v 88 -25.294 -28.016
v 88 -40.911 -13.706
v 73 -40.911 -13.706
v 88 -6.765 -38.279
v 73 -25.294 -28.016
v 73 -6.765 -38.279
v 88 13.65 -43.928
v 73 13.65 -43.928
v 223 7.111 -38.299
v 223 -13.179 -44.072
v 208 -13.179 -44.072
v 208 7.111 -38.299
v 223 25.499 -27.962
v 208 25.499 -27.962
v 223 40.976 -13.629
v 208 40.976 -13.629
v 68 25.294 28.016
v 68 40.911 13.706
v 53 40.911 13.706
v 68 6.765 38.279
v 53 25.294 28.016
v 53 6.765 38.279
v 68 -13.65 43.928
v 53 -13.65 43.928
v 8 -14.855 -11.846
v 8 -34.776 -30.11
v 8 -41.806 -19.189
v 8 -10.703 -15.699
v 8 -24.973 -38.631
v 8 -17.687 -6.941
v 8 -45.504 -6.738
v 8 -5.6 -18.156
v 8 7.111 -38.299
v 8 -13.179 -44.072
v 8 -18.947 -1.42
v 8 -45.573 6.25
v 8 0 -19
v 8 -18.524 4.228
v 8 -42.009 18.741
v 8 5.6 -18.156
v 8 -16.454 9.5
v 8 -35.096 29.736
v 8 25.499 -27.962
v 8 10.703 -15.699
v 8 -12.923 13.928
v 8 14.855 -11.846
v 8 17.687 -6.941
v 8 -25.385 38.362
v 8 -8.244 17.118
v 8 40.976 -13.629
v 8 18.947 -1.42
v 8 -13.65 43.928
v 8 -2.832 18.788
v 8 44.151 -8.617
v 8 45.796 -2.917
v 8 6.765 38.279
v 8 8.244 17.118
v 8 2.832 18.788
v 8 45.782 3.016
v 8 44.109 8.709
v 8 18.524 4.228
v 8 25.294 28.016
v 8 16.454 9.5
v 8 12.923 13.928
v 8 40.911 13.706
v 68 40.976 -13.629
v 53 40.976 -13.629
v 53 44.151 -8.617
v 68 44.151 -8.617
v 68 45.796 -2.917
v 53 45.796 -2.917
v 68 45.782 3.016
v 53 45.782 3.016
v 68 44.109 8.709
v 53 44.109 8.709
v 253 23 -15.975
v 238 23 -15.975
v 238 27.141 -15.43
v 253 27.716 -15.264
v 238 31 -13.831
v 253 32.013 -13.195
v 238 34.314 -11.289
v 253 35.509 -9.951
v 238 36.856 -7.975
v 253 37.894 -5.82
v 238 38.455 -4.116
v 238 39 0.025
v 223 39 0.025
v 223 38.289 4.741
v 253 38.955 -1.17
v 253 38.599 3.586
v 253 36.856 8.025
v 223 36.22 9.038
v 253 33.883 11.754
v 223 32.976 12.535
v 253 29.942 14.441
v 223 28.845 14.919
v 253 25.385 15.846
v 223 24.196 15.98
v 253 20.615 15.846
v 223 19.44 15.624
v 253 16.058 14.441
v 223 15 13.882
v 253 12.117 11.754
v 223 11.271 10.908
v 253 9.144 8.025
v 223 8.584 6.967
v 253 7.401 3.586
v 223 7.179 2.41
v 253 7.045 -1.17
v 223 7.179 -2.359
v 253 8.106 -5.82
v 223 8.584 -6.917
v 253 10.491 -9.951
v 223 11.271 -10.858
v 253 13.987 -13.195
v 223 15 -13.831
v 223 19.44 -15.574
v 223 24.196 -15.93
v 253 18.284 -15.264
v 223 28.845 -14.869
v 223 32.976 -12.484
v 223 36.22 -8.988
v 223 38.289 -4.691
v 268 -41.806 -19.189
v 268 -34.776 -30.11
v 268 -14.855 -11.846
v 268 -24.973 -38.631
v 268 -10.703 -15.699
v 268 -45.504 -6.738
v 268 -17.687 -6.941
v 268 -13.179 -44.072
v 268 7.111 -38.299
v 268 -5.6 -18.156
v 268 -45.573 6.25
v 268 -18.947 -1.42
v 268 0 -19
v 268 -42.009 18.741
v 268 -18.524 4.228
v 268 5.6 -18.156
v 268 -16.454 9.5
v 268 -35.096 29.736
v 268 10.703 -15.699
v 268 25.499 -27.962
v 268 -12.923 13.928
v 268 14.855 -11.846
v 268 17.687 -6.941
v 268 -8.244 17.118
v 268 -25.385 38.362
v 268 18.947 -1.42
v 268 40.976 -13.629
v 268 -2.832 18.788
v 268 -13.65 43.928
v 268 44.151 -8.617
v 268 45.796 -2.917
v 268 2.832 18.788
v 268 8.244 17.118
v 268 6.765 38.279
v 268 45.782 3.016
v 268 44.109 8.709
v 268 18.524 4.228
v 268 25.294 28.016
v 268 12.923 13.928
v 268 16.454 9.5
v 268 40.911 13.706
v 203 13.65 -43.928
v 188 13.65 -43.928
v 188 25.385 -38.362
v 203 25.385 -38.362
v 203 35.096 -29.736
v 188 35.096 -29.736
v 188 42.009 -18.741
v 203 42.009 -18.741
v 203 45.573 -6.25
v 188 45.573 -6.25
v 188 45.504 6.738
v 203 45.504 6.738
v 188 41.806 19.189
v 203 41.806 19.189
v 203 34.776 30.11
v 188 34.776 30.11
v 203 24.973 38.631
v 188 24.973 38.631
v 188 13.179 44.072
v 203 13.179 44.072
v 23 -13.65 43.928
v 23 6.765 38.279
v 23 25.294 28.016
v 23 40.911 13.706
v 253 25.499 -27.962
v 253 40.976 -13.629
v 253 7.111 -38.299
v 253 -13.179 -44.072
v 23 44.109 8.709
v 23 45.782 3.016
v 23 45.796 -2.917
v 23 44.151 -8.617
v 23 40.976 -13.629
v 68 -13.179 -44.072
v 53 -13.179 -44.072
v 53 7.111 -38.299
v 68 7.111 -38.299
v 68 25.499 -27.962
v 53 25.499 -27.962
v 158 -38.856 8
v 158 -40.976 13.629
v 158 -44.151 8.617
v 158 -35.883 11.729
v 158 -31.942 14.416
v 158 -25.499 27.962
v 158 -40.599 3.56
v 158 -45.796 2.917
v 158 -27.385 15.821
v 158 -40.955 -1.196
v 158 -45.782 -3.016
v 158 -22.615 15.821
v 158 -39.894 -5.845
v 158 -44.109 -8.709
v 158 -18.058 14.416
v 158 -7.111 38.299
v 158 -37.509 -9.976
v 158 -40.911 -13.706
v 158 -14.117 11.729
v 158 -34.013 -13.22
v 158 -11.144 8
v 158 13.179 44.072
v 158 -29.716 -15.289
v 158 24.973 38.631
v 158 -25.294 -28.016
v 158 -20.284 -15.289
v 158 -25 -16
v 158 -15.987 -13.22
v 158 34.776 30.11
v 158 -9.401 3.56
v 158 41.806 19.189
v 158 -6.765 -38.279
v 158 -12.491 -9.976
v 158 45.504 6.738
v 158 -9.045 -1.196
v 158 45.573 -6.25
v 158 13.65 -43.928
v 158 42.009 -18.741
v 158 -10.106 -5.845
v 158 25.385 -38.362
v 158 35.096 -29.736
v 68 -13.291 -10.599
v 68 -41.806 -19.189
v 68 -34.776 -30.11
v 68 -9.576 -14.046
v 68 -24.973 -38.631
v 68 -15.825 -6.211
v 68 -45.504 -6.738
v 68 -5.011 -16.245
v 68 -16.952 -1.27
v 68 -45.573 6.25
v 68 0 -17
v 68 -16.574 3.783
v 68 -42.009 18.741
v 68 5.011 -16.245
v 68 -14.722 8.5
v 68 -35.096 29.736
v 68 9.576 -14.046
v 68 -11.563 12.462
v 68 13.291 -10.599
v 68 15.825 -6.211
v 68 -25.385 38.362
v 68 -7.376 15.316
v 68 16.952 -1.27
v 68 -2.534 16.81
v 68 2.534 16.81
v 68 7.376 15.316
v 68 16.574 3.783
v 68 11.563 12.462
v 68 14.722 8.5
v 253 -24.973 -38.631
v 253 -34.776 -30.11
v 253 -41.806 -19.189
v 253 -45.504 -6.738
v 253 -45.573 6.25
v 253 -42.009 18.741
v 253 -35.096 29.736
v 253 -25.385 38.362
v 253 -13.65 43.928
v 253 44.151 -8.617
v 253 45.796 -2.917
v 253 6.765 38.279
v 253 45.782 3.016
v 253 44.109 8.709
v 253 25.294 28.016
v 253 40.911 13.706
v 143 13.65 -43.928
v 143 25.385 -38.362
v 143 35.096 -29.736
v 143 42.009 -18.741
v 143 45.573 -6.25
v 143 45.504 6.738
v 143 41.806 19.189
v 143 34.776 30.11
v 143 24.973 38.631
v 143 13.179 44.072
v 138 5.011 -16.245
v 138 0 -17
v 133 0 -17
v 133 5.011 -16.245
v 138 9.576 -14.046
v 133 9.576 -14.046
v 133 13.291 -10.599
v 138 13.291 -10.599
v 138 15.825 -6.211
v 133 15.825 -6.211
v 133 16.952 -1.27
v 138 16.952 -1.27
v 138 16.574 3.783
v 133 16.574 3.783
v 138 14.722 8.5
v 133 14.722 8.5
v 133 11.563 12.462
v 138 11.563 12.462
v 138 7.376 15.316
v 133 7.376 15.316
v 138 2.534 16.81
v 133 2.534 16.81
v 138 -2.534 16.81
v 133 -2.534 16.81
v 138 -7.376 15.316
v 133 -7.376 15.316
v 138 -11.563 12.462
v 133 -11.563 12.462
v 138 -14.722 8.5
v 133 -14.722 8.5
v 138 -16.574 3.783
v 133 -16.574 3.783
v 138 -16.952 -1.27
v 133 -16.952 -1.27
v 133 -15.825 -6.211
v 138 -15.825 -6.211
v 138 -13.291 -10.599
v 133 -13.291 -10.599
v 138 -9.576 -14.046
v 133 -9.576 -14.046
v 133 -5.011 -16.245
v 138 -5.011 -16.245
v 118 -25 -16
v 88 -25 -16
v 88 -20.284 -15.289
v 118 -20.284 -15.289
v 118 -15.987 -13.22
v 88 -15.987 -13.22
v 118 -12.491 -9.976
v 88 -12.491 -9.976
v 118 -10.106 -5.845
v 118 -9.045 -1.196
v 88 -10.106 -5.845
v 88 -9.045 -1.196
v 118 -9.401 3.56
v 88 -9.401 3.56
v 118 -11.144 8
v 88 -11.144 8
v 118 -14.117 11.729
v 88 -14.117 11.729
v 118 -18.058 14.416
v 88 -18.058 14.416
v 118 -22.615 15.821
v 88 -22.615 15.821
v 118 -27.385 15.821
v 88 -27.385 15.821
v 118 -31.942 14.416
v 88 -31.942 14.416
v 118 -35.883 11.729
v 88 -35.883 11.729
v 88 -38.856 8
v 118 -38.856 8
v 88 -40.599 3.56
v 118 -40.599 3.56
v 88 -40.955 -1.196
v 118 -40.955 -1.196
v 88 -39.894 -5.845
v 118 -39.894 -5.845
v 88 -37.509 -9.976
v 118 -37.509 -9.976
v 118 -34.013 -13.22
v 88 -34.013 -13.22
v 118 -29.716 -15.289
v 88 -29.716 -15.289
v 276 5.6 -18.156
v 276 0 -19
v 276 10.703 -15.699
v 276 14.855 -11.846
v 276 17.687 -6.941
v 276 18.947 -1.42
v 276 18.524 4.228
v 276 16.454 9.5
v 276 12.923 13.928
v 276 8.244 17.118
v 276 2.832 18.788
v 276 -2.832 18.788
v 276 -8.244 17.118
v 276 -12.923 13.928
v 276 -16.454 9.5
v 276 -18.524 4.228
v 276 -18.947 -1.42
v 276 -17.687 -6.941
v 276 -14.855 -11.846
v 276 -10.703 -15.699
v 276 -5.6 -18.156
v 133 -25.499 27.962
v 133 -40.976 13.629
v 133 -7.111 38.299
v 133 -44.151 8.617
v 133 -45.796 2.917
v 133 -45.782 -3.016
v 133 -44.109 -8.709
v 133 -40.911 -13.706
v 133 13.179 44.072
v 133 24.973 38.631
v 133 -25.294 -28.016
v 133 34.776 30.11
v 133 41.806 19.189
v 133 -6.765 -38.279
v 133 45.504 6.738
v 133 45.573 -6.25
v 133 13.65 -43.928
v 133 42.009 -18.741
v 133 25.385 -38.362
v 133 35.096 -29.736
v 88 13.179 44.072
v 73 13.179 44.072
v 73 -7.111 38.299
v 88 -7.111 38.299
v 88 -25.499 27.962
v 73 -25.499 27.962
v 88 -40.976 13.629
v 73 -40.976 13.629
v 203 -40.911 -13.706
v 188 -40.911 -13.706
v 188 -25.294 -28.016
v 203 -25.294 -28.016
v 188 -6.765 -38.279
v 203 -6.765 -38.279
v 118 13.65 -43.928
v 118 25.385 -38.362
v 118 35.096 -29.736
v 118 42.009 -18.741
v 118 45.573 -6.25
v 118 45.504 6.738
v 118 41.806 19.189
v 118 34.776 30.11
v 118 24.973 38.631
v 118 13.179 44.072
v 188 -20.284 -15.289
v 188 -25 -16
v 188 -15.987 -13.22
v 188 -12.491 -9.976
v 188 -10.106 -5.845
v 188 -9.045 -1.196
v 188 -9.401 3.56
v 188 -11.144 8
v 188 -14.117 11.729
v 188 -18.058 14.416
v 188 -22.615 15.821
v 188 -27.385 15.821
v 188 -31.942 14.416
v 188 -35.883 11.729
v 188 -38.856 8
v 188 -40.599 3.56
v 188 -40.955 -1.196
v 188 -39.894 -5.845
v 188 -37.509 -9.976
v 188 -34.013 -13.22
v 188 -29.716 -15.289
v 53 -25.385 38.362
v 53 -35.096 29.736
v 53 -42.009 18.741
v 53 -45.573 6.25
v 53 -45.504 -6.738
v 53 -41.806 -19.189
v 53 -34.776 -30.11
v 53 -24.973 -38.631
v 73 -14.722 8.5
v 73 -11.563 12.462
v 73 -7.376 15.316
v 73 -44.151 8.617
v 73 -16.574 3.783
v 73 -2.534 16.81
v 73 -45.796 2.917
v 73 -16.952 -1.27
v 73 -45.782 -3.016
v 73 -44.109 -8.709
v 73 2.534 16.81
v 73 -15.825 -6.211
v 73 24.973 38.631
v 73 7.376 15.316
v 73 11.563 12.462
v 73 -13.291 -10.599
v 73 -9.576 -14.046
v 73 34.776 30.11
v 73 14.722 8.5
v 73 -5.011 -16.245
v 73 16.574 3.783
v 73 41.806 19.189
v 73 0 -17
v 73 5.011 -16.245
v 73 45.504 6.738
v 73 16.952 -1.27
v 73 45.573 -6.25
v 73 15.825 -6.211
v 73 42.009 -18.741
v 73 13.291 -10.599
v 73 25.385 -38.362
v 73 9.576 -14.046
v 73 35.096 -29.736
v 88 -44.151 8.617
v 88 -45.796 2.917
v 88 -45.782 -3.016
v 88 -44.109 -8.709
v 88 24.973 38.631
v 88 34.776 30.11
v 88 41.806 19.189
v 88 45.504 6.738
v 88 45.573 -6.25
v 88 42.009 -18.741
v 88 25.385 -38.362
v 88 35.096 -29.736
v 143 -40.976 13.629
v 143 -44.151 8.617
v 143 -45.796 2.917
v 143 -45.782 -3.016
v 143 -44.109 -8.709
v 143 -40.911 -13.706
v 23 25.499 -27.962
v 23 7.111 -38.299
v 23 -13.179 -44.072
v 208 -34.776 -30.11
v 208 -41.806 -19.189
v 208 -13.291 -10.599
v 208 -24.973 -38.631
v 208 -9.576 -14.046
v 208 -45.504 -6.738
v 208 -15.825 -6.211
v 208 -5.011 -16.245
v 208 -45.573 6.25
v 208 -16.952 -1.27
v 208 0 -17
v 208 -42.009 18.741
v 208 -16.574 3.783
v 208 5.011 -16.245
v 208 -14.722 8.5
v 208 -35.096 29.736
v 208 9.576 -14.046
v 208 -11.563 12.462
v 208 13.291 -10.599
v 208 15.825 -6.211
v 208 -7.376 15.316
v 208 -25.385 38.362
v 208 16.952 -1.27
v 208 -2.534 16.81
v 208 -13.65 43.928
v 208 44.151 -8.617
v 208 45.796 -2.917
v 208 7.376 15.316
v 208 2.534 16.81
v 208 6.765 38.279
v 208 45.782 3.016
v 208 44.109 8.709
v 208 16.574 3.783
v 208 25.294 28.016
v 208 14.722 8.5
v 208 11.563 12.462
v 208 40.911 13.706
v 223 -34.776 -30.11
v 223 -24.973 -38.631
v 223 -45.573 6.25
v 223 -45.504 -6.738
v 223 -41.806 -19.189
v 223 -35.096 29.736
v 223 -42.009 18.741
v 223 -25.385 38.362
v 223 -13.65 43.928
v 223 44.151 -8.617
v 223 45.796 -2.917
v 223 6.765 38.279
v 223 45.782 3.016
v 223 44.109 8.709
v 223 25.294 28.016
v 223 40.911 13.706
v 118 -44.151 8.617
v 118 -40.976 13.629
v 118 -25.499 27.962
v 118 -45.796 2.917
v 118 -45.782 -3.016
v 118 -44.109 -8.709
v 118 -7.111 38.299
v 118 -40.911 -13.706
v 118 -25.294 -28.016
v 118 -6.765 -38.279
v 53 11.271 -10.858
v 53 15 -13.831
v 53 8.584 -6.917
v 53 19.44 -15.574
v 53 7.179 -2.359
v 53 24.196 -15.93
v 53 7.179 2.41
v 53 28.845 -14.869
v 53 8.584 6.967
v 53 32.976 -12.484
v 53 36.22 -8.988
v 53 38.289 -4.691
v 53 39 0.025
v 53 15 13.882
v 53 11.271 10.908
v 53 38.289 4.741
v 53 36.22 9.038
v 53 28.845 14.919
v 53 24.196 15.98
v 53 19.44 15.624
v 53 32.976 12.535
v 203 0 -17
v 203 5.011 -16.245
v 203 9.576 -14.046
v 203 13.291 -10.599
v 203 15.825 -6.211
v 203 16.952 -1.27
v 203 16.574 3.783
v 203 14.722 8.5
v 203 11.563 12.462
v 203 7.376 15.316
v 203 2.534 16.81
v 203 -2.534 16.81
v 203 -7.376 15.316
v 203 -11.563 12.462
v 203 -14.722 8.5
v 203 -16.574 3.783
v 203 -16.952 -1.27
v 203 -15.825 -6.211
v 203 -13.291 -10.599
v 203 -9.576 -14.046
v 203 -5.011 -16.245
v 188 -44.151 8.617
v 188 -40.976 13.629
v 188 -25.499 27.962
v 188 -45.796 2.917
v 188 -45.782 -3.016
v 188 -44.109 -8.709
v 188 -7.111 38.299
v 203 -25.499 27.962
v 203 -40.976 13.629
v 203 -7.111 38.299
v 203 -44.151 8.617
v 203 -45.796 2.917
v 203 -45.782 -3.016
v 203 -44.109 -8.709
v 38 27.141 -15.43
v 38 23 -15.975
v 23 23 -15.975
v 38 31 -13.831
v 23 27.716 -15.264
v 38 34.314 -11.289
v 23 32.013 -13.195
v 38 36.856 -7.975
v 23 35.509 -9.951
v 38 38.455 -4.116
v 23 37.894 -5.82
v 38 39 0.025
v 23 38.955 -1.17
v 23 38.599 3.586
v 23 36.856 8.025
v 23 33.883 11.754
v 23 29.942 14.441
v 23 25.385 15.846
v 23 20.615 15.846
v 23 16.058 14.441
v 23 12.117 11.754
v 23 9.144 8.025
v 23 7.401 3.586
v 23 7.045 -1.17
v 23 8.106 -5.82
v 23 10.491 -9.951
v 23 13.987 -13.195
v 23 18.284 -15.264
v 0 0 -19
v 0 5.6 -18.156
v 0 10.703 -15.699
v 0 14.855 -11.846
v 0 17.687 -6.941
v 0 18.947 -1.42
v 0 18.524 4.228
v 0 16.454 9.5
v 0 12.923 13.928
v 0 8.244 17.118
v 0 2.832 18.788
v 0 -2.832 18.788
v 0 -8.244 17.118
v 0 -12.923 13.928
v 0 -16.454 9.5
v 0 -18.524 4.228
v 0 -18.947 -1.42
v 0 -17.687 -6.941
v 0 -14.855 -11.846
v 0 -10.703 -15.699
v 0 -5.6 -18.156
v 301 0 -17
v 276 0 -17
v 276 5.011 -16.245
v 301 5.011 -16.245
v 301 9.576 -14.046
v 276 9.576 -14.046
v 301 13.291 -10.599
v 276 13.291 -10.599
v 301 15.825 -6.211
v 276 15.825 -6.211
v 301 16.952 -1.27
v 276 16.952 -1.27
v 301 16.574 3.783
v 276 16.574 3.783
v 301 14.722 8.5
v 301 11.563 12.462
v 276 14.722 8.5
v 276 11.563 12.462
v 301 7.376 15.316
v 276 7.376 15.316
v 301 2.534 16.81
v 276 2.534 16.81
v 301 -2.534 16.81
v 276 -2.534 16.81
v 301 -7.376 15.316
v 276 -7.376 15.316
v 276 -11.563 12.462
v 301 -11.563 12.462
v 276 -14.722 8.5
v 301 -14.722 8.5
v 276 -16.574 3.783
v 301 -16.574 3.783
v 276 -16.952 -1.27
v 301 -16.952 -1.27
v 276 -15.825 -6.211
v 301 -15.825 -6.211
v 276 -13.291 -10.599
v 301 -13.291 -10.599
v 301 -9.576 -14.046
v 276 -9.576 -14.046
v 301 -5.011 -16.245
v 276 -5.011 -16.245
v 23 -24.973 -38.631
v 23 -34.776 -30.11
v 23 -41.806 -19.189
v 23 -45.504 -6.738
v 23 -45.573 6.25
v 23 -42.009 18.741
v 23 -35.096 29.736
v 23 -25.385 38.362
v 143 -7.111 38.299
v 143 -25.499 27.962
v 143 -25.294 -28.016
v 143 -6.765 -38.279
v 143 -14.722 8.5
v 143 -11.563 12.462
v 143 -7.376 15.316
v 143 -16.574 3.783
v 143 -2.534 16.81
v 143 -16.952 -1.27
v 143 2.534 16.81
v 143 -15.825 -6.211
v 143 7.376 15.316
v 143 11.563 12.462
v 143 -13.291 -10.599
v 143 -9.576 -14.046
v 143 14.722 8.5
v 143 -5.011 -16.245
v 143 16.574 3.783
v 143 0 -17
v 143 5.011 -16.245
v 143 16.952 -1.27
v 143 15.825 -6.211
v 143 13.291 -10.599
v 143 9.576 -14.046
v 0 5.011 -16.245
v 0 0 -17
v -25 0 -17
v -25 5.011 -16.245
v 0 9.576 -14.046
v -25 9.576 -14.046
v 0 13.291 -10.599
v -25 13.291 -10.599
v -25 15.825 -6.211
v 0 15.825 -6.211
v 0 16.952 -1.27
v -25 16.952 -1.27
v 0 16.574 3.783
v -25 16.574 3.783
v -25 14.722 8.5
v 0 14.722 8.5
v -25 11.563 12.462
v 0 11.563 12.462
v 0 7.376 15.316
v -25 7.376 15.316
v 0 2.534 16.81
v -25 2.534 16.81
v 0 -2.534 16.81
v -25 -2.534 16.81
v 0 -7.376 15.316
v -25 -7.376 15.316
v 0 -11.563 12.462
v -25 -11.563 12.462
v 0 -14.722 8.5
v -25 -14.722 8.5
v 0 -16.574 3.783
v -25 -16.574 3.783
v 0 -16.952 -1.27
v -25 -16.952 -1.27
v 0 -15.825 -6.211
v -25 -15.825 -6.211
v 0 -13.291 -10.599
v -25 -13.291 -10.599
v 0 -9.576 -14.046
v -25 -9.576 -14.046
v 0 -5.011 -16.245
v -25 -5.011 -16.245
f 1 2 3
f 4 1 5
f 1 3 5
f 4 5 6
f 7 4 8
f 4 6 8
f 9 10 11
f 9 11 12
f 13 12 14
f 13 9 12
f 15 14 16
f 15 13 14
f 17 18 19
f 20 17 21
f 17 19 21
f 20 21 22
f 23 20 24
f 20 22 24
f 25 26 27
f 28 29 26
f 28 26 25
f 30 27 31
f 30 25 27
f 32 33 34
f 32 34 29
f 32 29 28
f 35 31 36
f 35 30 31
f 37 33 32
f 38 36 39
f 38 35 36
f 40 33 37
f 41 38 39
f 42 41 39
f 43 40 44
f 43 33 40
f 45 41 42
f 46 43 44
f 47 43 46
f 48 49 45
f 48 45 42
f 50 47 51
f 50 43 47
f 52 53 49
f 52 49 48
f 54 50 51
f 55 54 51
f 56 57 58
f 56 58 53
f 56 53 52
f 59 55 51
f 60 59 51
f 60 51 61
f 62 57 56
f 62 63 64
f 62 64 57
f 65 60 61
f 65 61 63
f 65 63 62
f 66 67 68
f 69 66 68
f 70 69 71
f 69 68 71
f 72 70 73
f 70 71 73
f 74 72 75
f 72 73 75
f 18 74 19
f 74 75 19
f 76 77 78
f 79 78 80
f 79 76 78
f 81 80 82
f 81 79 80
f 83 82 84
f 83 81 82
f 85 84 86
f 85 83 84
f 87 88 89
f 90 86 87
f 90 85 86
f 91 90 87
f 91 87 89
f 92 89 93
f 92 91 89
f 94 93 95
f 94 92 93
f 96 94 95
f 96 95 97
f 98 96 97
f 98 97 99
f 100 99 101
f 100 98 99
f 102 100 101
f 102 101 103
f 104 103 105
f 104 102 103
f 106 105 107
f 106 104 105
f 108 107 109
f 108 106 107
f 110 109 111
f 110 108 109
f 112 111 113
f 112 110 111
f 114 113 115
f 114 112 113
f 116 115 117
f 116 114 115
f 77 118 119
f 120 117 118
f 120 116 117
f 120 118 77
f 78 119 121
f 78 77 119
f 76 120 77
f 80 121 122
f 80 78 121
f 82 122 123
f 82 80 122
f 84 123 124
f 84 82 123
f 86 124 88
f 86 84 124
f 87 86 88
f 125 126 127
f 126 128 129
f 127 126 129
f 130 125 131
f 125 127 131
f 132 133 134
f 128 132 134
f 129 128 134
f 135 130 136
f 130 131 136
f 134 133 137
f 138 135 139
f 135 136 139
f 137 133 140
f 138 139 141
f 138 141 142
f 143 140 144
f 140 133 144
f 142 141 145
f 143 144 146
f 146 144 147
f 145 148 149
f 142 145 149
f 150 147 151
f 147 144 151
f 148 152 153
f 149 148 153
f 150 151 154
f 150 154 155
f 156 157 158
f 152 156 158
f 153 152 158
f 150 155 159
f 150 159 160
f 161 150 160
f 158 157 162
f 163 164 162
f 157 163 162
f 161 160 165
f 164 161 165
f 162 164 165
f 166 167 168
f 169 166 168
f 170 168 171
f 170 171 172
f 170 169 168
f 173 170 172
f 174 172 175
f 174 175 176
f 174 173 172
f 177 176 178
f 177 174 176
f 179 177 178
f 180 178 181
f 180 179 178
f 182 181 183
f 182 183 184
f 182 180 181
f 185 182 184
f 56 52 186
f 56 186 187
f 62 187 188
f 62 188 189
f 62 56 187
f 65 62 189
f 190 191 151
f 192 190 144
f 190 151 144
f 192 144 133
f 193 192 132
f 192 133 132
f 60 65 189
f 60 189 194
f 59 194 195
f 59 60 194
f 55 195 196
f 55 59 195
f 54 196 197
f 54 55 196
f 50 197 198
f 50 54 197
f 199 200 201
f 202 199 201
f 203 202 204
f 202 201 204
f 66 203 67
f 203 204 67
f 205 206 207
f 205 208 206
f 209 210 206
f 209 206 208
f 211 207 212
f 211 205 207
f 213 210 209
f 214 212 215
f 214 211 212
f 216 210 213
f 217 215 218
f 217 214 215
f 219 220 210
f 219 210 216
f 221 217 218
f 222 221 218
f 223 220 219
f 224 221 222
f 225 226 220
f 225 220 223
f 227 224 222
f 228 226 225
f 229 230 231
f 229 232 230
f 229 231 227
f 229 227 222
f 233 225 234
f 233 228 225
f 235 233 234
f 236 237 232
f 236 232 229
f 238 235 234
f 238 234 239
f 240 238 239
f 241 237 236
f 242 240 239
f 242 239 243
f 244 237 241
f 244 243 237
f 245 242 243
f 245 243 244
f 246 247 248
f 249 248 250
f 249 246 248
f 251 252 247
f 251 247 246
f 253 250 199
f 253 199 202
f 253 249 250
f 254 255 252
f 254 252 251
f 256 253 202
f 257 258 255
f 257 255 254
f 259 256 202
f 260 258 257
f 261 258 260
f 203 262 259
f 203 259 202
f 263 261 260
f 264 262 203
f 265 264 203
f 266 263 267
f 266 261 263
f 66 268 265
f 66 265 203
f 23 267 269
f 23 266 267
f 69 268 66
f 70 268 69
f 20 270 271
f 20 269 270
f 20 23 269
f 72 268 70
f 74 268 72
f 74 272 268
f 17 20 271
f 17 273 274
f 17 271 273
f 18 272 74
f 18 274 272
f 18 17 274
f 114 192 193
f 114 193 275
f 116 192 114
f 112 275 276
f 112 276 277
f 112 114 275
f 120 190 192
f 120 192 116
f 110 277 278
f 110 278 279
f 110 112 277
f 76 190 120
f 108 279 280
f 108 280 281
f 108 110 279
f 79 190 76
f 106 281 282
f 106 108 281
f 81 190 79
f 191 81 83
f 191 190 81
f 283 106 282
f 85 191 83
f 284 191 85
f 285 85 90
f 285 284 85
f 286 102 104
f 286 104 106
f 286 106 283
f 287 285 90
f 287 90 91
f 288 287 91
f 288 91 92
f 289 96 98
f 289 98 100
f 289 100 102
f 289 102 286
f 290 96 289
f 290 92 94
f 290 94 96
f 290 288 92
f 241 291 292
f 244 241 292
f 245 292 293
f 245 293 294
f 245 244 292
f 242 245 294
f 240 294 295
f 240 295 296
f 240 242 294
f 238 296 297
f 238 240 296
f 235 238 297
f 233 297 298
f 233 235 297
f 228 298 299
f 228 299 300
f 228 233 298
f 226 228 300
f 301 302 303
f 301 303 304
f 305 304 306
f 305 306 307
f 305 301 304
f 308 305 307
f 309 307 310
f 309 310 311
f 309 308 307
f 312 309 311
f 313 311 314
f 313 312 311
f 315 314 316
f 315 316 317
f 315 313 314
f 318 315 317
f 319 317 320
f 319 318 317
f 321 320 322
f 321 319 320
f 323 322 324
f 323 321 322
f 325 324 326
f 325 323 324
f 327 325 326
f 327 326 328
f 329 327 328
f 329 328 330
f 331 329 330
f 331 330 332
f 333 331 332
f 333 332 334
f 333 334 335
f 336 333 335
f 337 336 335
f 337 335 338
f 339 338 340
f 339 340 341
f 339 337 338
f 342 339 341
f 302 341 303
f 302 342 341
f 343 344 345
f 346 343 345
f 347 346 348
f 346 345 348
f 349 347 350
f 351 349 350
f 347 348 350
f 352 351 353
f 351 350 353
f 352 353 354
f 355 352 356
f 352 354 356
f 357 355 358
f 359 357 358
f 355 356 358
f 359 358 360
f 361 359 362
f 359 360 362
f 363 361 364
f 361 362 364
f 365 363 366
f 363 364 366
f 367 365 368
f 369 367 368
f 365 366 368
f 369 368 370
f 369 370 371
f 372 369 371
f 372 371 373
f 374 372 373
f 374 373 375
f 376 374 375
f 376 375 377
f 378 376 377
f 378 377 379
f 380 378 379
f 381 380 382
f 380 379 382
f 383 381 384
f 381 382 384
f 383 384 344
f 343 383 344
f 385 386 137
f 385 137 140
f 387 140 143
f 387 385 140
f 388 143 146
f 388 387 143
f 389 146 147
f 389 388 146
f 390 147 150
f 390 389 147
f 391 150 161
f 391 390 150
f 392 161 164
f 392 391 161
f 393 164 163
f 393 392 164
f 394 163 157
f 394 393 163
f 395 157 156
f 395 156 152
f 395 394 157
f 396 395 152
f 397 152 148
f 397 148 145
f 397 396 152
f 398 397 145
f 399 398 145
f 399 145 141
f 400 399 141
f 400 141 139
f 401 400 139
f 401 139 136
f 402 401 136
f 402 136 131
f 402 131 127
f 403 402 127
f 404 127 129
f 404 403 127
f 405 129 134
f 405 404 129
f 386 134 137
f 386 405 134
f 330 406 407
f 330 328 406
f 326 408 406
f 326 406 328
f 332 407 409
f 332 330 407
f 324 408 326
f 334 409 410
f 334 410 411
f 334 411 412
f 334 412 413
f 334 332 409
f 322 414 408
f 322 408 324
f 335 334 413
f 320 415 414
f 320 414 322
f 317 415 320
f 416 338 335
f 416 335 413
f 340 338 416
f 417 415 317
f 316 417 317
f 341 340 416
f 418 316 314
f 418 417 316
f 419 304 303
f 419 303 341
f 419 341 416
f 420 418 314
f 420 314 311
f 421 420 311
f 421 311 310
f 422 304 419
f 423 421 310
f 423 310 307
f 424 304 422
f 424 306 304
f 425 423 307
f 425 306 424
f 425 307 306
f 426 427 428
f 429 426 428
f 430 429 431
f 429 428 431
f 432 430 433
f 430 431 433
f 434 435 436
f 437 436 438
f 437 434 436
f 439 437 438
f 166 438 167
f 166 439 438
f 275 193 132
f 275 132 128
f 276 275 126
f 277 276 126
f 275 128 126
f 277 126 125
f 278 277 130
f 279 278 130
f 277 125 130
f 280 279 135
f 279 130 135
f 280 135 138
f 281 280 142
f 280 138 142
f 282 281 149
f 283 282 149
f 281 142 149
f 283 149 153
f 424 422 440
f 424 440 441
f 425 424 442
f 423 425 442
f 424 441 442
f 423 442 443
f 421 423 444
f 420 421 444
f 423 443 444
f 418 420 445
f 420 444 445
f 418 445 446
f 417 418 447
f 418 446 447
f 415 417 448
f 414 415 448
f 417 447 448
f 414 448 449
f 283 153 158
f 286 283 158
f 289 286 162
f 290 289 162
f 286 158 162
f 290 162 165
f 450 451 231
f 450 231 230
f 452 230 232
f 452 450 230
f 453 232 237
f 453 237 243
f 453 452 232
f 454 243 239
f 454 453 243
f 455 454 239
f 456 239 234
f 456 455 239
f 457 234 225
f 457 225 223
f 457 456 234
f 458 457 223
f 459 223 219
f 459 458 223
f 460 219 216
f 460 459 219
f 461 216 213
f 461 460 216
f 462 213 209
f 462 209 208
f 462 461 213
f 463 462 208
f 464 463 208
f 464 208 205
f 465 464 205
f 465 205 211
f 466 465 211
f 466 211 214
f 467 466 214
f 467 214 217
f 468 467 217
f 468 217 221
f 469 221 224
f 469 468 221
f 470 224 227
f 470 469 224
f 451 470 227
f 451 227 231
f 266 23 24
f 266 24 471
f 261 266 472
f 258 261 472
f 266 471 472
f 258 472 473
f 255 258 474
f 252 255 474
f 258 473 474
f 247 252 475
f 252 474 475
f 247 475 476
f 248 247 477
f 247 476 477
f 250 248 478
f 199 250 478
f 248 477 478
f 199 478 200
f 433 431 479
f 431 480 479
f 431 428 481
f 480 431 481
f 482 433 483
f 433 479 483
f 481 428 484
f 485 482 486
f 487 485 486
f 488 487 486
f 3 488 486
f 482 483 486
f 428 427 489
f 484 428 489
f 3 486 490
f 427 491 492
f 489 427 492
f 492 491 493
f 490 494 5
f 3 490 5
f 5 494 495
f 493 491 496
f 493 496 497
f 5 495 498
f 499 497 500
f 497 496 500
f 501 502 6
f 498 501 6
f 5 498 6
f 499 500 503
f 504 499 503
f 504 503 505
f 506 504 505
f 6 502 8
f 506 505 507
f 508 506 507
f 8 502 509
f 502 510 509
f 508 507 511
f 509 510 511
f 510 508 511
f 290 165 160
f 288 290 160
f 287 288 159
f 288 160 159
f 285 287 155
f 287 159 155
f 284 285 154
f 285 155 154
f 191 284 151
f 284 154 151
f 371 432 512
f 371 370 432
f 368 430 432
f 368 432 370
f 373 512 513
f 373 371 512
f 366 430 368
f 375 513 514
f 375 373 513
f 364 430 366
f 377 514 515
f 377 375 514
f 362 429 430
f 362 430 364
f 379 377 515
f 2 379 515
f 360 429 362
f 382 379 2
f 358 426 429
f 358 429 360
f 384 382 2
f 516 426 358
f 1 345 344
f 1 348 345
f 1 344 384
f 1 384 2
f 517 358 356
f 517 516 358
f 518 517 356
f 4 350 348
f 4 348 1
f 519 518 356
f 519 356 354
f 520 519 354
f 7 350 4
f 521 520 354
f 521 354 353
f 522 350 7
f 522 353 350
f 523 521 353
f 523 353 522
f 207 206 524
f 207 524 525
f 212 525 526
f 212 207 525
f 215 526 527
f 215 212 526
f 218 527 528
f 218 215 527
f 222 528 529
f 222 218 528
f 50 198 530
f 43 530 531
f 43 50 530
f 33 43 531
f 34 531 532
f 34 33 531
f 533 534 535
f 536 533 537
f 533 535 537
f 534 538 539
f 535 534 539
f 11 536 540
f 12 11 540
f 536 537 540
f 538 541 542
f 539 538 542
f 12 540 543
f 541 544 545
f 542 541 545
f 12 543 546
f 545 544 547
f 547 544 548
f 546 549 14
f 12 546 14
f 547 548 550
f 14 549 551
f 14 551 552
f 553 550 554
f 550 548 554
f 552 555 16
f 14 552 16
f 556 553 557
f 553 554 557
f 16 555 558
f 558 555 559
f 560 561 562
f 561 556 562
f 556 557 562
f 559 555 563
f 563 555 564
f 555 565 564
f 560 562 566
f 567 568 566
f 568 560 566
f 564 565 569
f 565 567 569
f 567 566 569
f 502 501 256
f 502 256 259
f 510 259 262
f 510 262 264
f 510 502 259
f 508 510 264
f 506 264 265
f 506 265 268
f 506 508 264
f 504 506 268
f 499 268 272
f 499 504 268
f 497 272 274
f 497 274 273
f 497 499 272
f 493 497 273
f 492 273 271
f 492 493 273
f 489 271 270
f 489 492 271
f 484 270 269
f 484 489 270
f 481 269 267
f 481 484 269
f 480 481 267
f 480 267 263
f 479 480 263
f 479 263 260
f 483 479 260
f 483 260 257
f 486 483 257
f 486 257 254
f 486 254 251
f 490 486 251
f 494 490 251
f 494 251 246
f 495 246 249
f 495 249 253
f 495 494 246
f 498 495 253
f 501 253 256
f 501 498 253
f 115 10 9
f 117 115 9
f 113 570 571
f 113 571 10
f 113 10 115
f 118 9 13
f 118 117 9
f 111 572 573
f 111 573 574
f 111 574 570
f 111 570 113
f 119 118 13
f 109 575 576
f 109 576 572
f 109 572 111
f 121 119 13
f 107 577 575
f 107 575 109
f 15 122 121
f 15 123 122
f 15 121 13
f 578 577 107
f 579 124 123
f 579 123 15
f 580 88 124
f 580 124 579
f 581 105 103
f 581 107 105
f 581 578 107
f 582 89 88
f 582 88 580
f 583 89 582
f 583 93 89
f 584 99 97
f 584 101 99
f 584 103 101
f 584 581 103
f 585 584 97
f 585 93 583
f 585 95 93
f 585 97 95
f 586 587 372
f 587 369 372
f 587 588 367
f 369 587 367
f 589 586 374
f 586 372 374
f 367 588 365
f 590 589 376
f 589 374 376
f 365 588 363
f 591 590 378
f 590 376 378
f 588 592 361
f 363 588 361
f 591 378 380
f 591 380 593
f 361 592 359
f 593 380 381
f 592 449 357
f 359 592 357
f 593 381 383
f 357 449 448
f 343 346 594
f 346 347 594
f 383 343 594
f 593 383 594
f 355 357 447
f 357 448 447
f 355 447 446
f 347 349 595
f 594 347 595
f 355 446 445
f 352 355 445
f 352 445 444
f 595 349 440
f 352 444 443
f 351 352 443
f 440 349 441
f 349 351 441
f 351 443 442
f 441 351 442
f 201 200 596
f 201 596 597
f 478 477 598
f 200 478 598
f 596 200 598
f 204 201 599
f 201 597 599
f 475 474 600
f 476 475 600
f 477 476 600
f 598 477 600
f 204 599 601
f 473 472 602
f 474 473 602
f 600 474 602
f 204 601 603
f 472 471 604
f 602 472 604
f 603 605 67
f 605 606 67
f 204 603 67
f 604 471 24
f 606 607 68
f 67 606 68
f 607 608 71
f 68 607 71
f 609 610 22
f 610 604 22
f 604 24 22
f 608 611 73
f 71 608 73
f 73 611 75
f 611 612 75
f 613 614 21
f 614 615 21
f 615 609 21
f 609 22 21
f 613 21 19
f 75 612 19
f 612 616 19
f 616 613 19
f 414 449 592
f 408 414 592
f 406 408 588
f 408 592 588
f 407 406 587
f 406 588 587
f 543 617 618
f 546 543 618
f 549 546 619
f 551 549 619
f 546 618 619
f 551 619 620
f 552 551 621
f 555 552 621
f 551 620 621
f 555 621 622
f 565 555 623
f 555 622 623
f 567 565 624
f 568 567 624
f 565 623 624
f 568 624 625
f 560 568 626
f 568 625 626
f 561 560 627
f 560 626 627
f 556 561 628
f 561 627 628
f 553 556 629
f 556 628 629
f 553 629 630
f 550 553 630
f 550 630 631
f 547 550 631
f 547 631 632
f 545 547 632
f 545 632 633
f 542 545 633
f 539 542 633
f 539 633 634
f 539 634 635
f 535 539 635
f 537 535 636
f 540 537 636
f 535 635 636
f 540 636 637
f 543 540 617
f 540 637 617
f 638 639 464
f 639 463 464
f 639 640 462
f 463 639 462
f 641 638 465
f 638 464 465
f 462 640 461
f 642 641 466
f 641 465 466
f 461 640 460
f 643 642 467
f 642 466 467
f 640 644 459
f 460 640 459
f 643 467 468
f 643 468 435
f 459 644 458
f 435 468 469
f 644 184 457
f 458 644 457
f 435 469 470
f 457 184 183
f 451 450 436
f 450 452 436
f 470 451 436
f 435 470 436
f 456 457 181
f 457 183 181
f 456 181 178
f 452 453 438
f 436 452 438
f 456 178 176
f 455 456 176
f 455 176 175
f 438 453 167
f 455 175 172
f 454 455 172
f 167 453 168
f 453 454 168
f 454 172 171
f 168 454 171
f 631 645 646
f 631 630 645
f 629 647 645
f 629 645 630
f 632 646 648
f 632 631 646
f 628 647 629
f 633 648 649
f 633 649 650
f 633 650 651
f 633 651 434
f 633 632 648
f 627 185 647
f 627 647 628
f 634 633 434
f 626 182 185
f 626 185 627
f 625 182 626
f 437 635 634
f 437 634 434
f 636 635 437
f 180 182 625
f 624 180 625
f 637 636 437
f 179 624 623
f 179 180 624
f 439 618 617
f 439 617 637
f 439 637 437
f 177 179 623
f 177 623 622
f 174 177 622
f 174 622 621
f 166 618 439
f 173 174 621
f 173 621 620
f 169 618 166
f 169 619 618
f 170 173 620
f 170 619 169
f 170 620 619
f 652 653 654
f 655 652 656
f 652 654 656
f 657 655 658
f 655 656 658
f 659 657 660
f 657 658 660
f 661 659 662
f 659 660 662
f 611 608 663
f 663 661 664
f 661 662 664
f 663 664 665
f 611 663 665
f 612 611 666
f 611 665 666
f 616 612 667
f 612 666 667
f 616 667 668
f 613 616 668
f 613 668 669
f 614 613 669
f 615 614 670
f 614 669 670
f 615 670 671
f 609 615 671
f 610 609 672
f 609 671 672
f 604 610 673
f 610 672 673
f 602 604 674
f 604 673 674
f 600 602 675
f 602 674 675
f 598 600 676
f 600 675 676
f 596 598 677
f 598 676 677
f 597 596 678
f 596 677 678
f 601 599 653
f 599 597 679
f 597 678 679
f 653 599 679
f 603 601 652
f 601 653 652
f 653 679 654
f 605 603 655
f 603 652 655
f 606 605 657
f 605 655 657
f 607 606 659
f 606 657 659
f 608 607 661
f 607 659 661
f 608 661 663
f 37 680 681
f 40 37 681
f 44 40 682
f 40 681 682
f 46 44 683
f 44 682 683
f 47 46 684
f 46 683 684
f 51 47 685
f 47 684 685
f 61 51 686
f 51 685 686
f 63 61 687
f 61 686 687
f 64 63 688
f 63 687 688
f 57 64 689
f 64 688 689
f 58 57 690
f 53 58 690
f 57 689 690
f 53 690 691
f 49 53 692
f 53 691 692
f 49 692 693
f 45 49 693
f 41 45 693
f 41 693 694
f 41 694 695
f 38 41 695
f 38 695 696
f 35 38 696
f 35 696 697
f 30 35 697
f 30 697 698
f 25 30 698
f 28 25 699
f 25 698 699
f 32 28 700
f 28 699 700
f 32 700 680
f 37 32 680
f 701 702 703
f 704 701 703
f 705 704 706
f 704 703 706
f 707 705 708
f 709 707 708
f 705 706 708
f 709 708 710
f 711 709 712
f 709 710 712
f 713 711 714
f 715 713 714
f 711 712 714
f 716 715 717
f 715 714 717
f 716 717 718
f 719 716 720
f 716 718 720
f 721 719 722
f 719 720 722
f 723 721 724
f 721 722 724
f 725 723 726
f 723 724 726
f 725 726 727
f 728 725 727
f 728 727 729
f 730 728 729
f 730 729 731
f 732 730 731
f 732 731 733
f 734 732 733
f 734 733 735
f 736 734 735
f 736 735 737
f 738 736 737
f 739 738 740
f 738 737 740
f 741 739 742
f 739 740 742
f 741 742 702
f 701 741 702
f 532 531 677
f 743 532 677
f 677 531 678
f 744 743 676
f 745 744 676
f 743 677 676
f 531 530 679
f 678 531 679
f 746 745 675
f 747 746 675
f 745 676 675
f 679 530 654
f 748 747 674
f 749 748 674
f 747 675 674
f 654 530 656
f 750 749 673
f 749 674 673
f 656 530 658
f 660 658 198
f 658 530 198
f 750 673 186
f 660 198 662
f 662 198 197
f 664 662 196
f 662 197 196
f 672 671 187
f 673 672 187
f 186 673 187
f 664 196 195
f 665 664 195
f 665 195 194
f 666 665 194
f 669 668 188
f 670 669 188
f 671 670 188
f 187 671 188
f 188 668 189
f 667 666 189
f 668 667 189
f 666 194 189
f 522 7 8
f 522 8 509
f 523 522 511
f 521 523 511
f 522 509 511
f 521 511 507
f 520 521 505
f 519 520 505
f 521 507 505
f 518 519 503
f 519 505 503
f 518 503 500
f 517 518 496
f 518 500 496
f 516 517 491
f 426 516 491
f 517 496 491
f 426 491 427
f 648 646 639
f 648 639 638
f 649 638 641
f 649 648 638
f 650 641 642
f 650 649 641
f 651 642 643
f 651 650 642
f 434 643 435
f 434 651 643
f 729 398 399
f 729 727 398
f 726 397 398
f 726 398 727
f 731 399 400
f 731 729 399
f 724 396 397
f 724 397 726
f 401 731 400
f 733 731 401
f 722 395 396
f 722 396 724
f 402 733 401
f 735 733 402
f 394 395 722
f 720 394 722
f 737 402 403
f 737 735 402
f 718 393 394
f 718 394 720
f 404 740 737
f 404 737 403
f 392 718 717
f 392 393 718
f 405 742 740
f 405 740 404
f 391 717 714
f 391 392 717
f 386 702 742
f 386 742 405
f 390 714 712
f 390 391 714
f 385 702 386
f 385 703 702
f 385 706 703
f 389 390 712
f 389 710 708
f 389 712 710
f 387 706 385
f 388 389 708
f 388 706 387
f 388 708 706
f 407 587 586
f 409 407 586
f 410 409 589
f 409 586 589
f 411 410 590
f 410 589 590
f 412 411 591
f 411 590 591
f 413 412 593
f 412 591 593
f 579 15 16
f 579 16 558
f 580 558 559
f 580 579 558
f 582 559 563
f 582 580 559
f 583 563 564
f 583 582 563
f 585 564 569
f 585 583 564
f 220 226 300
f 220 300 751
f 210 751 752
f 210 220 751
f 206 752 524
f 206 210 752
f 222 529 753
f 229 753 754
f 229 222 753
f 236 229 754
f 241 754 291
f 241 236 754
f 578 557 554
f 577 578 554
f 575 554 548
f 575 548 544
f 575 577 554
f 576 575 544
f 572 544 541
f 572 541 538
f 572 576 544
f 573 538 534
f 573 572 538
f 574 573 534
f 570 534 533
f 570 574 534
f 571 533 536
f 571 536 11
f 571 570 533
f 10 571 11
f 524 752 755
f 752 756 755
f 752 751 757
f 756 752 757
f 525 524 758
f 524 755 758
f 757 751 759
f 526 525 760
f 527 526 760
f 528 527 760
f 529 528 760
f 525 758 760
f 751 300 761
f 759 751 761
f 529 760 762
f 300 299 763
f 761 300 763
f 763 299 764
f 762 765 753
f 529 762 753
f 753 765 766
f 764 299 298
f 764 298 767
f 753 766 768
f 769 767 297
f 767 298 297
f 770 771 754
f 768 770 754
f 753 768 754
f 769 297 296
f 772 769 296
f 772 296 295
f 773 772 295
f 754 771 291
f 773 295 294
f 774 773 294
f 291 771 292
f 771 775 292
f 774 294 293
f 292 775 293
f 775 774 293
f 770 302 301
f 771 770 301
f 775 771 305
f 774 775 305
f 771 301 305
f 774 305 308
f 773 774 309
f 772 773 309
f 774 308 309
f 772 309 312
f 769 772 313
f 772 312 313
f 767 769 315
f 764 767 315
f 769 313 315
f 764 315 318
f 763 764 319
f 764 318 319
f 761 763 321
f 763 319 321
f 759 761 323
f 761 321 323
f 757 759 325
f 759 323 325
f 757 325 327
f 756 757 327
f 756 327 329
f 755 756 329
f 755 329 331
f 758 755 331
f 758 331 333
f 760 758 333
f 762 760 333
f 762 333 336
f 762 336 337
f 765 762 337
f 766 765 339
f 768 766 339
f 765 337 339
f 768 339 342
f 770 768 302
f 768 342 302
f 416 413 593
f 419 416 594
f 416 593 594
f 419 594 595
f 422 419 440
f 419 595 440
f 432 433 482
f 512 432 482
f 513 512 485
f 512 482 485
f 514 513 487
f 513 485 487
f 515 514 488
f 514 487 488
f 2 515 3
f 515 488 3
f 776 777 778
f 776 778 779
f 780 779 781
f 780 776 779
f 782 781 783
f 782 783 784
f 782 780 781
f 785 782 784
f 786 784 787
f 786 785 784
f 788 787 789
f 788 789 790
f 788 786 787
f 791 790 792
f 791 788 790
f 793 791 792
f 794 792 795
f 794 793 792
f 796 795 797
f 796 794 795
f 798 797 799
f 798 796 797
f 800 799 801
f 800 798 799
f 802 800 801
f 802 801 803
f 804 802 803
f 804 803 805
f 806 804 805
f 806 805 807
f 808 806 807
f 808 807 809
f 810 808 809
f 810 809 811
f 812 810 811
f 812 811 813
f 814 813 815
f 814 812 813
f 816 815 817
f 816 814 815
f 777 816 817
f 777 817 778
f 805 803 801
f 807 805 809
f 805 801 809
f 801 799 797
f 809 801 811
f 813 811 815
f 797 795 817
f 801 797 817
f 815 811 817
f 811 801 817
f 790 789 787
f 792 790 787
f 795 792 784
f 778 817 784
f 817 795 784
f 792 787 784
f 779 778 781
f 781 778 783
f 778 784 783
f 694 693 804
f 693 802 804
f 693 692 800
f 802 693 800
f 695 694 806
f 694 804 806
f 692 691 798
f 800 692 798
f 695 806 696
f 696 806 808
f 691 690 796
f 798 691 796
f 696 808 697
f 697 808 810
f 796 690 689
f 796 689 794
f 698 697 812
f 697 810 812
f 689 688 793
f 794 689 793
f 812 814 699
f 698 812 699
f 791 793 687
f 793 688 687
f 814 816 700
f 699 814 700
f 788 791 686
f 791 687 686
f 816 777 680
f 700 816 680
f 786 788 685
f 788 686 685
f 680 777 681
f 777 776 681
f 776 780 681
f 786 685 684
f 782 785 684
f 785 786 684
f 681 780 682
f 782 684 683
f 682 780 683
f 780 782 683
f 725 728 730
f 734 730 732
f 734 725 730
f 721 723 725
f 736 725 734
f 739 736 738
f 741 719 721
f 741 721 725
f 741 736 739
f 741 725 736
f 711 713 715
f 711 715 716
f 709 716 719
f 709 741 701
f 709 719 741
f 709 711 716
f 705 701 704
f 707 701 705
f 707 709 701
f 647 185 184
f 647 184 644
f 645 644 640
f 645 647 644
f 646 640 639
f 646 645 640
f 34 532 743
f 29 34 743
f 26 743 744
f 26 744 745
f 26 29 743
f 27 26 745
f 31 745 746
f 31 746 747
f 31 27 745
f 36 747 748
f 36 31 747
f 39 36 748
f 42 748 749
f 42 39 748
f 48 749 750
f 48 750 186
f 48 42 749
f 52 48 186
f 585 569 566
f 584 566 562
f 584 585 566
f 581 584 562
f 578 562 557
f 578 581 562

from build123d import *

# Parameters (mm, degrees)
SKETCH1_R            = 17
BOSS_EXTRUDE3_DEPTH  = 25
SKETCH1_5_R          = 19
BOSS_EXTRUDE4_DEPTH  = 8
BOSS_EXTRUDE5_DEPTH  = 15
SKETCH3_R            = 16
BOSS_EXTRUDE6_DEPTH  = 15
MIRROR1_START        = 53
MIRROR1_DEPTH        = 15
MIRROR1_START_2      = 38
MIRROR1_2_OUTLINE_R  = 16
MIRROR1_2_DEPTH      = 15
BOSS_EXTRUDE7_START  = 5
SKETCH4_R            = 17
BOSS_EXTRUDE7_DEPTH  = 5
BOSS_EXTRUDE8_DEPTH  = 15
SKETCH6_R            = 16
BOSS_EXTRUDE9_DEPTH  = 30
BOSS_EXTRUDE10_DEPTH = 15
BOSS_EXTRUDE11_START = 5
SKETCH8_R            = 17
BOSS_EXTRUDE11_DEPTH = 5


# Read off the part's stored shape, not the designer's step: Mirror1
with BuildPart() as part:
    # Sketch1 → Boss-Extrude3 (new body)
    with BuildSketch(Plane(origin=(0, 0, 0), x_dir=(0, 0, -1), z_dir=(1, 0, 0))):
        Circle(SKETCH1_R)
    extrude(amount=-BOSS_EXTRUDE3_DEPTH)

    # Sketch1<5> → Boss-Extrude4 (add)
    with BuildSketch(Plane(origin=(0, 0, 0), x_dir=(0, 0, -1), z_dir=(1, 0, 0))):
        Circle(SKETCH1_5_R)
    extrude(amount=BOSS_EXTRUDE4_DEPTH)

    # Sketch2 → Boss-Extrude5 (add)
    with BuildSketch(Plane(origin=(8, 0, 0), x_dir=(0, 0, -1), z_dir=(1, 0, 0))):
        with BuildLine():
            ThreePointArc((-13.706014257, 40.910536546), (-0.050406066, 45.999939505), (13.629476778, 40.97614981))
            ThreePointArc((13.629476778, 40.97614981), (33.671459186, 16.608703248), (44.071795254, -13.178651794))
            ThreePointArc((44.071795254, -13.178651794), (0.246197834, -45.999341154), (-43.928204746, -13.649645701))
            ThreePointArc((-43.928204746, -13.649645701), (-33.694579877, 16.332192974), (-13.706014257, 40.910536546))
        make_face()
    extrude(amount=BOSS_EXTRUDE5_DEPTH)

    # Sketch3 → Boss-Extrude6 (add)
    with BuildSketch(Plane(origin=(23, 0, 0), x_dir=(0, 0, -1), z_dir=(1, 0, 0))):
        with Locations((-0.025203033, 22.999969753)):
            Circle(SKETCH3_R)
    extrude(amount=BOSS_EXTRUDE6_DEPTH)



with BuildPart() as body_2:
    # Mirror1 outline → Mirror1 (new body)
    with BuildSketch(Plane.YZ.offset(MIRROR1_START)):
        with BuildLine():
            ThreePointArc((40.97614981, -13.629476778), (45.999939505, 0.050406066), (40.910536546, 13.706014257))
            ThreePointArc((40.910536546, 13.706014257), (16.332192974, 33.694579877), (-13.649645701, 43.928204746))
            ThreePointArc((-13.649645701, 43.928204746), (-45.999341154, -0.246197834), (-13.178651794, -44.071795254))
            ThreePointArc((-13.178651794, -44.071795254), (16.608703248, -33.671459186), (40.97614981, -13.629476778))
        make_face()
    extrude(amount=MIRROR1_DEPTH)


with BuildPart() as part_1:
    add(part.part)

    add(body_2.part)  # Mirror1 2 merges body 2
    # Mirror1 2 outline → Mirror1 2 (add)
    with BuildSketch(Plane.YZ.offset(MIRROR1_START_2)):
        with Locations((22.999969753, 0.025203033)):
            Circle(MIRROR1_2_OUTLINE_R)
    extrude(amount=MIRROR1_2_DEPTH)

    # Sketch4 → Boss-Extrude7 (add)
    with BuildSketch(Plane(origin=(68, 0, 0), x_dir=(0, 0, -1), z_dir=(1, 0, 0)).offset(BOSS_EXTRUDE7_START)):
        Circle(SKETCH4_R)
    extrude(amount=-BOSS_EXTRUDE7_DEPTH)

    # Sketch5 → Boss-Extrude8 (add)
    with BuildSketch(Plane(origin=(73, 0, 0), x_dir=(0, 0, -1), z_dir=(1, 0, 0))):
        with BuildLine():
            ThreePointArc((-13.629476778, -40.97614981), (0.050406066, -45.999939505), (13.706014257, -40.910536546))
            ThreePointArc((13.706014257, -40.910536546), (33.694579877, -16.332192974), (43.928204746, 13.649645701))
            ThreePointArc((43.928204746, 13.649645701), (-0.246197834, 45.999341154), (-44.071795254, 13.178651794))
            ThreePointArc((-44.071795254, 13.178651794), (-33.671459186, -16.608703248), (-13.629476778, -40.97614981))
        make_face()
    extrude(amount=BOSS_EXTRUDE8_DEPTH)

    # Sketch6 → Boss-Extrude9 (add)
    with BuildSketch(Plane(origin=(88, 0, 0), x_dir=(0, 0, -1), z_dir=(1, 0, 0))):
        with Locations((0, -25)):
            Circle(SKETCH6_R)
    extrude(amount=BOSS_EXTRUDE9_DEPTH)

    # Sketch7 → Boss-Extrude10 (add)
    with BuildSketch(Plane(origin=(118, 0, 0), x_dir=(0, 0, -1), z_dir=(1, 0, 0))):
        with BuildLine():
            ThreePointArc((-13.629476778, -40.97614981), (0.050406066, -45.999939505), (13.706014257, -40.910536546))
            ThreePointArc((13.706014257, -40.910536546), (33.694579877, -16.332192974), (43.928204746, 13.649645701))
            ThreePointArc((43.928204746, 13.649645701), (-0.246197834, 45.999341154), (-44.071795254, 13.178651794))
            ThreePointArc((-44.071795254, 13.178651794), (-33.671459186, -16.608703248), (-13.629476778, -40.97614981))
        make_face()
    extrude(amount=BOSS_EXTRUDE10_DEPTH)

    # Sketch8 → Boss-Extrude11 (add)
    with BuildSketch(Plane(origin=(133, 0, 0), x_dir=(0, 0, -1), z_dir=(1, 0, 0)).offset(BOSS_EXTRUDE11_START)):
        Circle(SKETCH8_R)
    extrude(amount=-BOSS_EXTRUDE11_DEPTH)

    # Mirror2: part across plane


with BuildPart() as part_2:
    add(part_1.part)
    add(part_1.part.mirror(Plane(origin=(138, 0, 0), x_dir=(0, 0, 1), z_dir=(1, 0, 0))))


solid = part_2.part
